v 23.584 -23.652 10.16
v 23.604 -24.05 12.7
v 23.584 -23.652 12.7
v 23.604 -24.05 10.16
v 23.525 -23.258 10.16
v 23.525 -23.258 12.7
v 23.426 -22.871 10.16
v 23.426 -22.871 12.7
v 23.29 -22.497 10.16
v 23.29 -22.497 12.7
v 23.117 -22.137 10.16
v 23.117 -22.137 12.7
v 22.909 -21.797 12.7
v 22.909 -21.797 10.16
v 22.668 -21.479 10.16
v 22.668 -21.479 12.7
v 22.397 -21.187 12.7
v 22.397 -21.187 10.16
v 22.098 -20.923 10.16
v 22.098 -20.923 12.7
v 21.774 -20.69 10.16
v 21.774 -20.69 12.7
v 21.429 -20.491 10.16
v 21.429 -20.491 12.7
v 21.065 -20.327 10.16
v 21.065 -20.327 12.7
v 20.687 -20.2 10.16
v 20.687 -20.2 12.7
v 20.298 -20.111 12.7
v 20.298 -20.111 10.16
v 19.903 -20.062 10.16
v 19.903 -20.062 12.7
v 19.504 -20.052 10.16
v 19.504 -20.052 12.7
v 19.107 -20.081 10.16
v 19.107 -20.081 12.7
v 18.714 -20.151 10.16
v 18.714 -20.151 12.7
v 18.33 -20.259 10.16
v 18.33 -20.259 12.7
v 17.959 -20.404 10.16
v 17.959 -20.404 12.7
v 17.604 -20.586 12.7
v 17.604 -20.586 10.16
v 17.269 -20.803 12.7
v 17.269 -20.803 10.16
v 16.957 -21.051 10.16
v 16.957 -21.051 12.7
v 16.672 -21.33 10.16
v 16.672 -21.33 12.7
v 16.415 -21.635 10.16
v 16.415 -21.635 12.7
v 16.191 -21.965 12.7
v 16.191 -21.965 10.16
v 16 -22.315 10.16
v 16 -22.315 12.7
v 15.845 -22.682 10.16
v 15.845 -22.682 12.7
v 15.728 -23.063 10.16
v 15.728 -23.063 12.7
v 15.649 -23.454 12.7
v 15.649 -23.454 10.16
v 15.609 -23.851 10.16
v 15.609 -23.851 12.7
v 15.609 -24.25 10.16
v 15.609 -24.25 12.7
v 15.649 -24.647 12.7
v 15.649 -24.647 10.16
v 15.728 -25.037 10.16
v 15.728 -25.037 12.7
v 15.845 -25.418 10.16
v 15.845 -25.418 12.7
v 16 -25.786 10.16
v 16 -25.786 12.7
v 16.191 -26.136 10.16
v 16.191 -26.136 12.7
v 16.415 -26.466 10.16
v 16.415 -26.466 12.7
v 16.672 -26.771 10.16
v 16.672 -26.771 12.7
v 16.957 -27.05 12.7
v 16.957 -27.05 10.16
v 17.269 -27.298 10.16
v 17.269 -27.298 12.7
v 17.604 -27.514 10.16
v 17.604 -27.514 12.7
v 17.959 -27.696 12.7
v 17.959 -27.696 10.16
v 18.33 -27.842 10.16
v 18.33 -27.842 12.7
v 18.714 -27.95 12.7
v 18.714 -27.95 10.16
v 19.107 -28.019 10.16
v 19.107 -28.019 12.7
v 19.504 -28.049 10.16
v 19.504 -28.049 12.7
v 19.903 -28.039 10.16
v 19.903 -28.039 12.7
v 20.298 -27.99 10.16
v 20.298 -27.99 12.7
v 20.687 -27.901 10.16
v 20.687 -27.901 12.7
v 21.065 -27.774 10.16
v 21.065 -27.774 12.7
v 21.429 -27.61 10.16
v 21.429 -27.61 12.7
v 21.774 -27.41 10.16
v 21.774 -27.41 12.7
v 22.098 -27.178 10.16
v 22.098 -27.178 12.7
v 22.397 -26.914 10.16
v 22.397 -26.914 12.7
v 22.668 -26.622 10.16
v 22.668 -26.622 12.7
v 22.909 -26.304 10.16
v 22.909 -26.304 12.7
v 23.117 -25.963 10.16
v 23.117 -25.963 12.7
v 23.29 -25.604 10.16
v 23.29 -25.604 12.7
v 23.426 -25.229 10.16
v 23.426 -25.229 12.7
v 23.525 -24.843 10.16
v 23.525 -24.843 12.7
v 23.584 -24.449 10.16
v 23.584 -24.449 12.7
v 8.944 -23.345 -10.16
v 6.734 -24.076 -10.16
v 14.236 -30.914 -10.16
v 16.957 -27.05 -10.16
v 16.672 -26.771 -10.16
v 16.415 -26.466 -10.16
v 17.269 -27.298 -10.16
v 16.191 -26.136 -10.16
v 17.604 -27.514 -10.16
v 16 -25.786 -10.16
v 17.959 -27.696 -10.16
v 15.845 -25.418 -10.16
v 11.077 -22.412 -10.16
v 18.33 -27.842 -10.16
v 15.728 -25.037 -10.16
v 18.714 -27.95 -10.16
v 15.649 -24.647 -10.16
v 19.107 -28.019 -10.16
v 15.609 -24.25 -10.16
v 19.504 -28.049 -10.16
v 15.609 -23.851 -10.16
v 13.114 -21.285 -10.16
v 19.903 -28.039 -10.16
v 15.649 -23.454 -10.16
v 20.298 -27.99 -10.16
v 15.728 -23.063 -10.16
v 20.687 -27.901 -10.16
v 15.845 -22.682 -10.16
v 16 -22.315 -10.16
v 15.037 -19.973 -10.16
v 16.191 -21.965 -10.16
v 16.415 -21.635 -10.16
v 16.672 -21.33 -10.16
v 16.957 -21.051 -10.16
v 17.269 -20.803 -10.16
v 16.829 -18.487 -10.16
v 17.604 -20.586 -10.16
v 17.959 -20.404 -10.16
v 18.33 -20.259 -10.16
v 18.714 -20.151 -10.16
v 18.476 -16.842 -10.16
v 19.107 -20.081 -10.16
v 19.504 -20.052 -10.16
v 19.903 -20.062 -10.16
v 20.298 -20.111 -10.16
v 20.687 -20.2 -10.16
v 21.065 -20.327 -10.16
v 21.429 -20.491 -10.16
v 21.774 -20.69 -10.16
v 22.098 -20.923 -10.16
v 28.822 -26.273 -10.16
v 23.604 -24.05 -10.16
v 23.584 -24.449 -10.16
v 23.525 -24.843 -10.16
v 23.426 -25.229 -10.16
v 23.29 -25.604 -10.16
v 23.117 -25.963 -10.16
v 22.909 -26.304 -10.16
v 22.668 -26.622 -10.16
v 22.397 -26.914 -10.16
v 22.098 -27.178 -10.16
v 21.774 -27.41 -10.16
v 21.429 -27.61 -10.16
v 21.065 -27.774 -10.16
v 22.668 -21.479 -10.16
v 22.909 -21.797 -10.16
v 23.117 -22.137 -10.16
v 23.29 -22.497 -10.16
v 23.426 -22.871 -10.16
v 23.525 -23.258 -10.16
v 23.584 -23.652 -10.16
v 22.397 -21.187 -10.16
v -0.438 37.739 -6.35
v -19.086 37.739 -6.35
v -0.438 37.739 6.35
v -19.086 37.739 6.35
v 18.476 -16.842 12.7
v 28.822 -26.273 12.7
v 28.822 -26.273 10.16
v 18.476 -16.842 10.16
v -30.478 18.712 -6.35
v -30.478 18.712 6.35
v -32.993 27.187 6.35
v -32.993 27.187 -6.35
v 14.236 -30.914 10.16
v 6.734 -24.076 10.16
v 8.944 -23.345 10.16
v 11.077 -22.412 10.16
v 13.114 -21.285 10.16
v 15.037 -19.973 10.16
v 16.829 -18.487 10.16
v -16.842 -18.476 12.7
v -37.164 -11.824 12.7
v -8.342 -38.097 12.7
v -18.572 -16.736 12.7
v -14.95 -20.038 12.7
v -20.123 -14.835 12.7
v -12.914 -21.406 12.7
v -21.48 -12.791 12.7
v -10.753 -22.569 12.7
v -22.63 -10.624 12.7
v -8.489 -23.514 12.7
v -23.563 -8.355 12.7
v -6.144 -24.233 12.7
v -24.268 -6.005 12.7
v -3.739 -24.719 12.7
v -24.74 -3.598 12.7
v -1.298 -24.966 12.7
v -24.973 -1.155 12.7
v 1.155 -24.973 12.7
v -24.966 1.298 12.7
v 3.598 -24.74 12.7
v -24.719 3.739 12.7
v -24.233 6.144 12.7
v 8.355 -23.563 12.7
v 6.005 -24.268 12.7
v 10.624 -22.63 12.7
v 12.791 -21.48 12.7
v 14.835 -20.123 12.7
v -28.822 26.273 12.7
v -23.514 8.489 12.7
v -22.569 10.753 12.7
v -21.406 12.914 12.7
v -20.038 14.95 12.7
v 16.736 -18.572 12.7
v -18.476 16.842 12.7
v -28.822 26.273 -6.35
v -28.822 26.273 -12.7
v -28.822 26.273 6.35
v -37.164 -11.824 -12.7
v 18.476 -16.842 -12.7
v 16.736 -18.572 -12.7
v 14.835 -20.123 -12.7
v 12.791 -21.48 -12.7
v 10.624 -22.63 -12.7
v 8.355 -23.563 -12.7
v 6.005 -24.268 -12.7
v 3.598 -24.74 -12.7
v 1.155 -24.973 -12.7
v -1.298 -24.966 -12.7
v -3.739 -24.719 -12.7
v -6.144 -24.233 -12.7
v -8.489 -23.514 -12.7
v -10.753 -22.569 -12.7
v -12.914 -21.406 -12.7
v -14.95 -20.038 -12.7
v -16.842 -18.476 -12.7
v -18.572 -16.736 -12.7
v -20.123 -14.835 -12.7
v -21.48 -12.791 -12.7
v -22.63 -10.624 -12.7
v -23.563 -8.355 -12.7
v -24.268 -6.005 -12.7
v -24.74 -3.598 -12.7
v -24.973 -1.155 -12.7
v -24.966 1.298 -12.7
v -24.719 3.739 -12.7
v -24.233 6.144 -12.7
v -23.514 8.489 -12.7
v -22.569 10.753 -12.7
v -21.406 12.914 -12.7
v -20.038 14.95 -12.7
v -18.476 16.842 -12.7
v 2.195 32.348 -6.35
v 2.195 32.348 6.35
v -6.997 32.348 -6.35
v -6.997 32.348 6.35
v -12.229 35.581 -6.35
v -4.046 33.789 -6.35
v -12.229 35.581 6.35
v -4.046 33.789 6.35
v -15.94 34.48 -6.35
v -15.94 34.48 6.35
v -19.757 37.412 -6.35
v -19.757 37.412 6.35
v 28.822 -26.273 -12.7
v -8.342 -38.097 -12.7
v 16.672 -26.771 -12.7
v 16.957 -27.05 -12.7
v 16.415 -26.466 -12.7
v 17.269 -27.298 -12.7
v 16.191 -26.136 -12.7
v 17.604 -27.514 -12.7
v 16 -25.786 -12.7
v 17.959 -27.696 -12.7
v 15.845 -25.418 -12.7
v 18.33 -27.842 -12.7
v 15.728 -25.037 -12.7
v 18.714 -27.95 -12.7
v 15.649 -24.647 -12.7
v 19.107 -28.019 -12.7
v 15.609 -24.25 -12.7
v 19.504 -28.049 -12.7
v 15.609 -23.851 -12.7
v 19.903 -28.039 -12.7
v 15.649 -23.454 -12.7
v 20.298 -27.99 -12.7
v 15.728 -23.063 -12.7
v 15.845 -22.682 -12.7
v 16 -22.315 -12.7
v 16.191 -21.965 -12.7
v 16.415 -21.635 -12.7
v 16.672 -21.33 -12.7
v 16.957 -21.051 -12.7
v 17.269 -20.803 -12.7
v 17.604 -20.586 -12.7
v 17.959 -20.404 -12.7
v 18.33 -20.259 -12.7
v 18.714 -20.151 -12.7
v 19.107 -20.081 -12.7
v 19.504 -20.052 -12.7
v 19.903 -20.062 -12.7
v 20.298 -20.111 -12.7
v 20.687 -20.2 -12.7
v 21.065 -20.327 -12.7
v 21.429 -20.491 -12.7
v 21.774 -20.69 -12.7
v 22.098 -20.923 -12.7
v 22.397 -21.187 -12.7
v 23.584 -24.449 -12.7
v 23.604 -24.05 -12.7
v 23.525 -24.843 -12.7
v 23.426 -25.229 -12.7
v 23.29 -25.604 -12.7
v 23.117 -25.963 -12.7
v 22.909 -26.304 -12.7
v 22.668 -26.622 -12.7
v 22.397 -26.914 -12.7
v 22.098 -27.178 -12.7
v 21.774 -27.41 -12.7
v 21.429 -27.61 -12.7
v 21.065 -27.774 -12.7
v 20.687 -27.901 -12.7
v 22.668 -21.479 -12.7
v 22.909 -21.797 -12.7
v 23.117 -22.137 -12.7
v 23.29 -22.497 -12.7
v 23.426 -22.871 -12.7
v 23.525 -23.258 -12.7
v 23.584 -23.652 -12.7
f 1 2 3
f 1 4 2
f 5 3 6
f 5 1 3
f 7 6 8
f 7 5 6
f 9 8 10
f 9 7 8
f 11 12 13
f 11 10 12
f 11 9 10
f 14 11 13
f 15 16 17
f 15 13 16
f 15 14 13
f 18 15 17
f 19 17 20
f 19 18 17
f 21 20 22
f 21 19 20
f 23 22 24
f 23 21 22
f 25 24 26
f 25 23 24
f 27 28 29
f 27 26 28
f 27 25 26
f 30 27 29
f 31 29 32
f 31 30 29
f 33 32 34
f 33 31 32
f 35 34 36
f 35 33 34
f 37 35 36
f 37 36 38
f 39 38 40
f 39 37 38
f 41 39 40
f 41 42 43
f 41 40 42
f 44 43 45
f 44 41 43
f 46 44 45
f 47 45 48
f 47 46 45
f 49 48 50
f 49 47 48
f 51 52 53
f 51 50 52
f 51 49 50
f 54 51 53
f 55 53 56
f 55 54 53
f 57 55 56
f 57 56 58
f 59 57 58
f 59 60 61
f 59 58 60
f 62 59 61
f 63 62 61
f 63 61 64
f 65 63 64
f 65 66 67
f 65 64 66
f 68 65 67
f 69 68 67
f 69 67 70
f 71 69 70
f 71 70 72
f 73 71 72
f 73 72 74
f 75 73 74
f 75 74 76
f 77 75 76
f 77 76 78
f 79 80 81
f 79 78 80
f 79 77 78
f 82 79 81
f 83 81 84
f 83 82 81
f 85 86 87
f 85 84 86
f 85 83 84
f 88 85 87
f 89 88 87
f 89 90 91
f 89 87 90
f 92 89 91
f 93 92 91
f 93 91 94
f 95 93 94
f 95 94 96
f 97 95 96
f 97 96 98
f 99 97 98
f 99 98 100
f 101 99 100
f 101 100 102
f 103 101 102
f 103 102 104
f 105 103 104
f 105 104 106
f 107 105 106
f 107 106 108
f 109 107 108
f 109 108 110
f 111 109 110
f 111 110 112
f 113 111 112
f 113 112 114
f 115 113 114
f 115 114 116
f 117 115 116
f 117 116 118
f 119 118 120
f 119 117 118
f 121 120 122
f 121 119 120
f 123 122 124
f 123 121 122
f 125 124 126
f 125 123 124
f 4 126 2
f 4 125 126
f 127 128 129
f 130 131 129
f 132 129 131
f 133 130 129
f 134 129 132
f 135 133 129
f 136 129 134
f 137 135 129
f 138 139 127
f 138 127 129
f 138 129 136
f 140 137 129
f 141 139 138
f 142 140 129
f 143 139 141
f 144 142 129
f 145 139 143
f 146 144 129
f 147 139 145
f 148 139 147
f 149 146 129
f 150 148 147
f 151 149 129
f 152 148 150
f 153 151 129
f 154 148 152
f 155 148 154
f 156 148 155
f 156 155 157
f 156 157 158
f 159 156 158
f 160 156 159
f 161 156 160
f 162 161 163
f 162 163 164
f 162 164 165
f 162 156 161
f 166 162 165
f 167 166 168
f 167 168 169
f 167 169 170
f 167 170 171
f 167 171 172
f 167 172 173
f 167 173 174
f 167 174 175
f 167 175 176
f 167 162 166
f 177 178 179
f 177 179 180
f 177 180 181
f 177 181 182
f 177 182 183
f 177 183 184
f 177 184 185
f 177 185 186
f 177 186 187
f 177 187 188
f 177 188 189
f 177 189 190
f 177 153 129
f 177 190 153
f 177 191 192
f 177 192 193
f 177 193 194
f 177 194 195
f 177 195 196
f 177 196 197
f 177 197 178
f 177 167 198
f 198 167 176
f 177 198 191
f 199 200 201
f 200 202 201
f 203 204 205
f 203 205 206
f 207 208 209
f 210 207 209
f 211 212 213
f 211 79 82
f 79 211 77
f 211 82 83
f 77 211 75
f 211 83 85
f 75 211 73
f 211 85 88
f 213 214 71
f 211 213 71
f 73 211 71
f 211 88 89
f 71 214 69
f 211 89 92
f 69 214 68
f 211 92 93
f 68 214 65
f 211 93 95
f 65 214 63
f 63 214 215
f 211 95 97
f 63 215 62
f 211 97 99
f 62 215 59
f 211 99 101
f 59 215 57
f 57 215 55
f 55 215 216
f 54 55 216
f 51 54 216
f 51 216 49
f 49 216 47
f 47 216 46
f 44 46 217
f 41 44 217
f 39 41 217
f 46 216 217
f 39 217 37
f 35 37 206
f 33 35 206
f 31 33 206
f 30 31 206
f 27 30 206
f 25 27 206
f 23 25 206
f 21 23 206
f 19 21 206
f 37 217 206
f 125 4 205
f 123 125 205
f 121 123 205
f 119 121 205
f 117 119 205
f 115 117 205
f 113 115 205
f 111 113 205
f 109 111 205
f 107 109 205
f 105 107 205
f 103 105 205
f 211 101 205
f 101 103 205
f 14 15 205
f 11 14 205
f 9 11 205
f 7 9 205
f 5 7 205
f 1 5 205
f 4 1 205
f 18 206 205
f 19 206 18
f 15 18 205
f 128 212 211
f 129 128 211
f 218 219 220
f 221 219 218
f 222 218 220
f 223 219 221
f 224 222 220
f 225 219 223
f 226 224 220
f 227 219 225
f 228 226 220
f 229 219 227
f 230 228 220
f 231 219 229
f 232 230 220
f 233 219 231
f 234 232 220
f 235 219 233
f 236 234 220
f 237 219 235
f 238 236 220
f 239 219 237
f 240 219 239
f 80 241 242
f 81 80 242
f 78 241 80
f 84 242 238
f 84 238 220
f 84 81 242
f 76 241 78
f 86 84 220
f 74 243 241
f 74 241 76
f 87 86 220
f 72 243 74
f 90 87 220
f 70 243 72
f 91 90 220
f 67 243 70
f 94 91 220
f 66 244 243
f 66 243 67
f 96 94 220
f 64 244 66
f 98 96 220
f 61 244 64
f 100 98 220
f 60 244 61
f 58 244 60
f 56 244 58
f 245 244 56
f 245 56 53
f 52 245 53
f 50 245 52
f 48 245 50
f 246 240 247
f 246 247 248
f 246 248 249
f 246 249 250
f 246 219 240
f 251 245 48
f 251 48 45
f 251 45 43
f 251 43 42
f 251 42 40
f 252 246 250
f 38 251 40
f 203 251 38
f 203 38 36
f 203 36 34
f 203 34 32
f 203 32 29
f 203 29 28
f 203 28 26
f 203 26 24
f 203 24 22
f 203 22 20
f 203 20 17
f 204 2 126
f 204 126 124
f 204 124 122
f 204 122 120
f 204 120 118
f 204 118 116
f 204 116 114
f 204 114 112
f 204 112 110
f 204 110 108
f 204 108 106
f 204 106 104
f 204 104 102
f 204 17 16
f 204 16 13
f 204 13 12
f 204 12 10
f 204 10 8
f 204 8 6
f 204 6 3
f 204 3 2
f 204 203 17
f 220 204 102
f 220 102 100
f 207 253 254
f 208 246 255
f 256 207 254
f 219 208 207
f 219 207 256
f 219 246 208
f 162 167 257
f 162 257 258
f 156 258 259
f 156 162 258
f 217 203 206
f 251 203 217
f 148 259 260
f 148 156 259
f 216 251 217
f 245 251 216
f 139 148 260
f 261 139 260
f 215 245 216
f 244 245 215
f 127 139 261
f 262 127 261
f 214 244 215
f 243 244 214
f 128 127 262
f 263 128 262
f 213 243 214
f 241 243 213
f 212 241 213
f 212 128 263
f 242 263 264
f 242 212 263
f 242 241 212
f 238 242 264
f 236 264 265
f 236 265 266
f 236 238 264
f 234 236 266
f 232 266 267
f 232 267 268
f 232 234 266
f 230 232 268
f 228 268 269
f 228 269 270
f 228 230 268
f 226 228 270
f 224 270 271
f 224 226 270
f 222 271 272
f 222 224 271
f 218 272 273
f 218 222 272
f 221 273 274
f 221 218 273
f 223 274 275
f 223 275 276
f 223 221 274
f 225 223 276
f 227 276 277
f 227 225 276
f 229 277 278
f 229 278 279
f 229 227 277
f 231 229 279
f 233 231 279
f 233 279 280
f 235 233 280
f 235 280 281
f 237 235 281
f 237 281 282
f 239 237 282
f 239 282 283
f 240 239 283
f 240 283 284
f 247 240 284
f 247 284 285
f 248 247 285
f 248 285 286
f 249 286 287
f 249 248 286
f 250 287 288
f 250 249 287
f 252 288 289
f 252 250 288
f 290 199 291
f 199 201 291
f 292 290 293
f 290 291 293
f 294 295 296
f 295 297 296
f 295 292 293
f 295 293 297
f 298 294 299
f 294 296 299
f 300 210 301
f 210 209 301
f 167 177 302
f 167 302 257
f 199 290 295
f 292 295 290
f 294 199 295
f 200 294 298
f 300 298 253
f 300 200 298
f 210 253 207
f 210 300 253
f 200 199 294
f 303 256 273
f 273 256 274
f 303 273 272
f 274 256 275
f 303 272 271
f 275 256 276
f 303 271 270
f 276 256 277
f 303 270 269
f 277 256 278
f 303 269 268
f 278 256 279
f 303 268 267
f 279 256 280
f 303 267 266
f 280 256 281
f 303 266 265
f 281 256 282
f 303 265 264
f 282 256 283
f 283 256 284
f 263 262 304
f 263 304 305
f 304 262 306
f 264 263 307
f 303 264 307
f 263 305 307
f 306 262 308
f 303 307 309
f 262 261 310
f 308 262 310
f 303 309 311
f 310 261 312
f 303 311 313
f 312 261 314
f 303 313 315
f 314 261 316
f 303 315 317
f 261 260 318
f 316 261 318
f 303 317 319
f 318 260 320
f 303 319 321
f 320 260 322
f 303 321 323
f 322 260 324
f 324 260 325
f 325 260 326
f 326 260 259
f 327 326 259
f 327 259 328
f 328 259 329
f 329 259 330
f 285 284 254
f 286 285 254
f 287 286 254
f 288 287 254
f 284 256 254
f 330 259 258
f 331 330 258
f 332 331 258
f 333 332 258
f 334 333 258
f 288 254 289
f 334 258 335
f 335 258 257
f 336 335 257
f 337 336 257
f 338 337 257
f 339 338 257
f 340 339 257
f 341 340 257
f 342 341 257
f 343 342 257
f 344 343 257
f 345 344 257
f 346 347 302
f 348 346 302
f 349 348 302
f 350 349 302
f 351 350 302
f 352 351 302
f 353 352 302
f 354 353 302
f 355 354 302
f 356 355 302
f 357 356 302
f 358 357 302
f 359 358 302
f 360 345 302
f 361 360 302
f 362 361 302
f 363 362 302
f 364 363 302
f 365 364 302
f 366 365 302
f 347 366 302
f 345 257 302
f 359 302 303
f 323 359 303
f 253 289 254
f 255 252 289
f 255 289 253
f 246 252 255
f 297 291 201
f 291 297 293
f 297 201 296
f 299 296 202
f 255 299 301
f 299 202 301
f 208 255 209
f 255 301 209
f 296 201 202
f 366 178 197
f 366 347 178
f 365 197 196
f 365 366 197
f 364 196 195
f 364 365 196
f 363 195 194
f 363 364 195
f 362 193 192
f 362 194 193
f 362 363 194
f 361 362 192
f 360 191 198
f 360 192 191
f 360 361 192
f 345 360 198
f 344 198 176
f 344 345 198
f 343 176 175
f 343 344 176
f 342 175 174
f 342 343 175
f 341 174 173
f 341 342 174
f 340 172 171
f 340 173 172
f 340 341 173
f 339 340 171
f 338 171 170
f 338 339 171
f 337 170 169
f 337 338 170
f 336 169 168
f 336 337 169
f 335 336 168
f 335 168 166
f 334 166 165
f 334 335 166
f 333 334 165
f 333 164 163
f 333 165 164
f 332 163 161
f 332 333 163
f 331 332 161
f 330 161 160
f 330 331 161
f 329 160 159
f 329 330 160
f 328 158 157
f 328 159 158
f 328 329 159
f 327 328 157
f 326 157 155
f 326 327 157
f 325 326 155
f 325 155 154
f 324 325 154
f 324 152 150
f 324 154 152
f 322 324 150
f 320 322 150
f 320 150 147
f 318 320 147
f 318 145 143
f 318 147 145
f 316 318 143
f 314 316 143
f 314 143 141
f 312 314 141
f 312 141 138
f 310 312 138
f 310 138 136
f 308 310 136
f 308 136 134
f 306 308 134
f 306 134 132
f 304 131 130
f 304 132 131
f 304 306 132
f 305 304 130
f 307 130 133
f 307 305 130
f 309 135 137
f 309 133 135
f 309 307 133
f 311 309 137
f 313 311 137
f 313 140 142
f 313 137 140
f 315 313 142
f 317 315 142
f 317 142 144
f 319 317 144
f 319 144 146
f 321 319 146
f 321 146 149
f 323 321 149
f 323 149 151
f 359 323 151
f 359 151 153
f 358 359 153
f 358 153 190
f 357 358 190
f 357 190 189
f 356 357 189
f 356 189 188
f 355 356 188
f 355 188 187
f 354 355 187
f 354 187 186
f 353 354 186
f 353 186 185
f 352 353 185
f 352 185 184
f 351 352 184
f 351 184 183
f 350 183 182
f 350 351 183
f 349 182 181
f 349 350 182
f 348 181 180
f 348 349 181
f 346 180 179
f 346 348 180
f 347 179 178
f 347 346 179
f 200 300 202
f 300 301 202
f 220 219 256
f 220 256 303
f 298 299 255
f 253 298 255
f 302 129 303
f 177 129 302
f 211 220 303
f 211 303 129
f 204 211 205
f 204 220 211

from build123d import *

# Parameters (mm, degrees)
BOSS_EXTRUDE1_DEPTH     = 12.7
CUT_EXTRUDE1_DEPTH      = 10.16
CUT_EXTRUDE2_DEPTH      = 59.972520527
CUT_EXTRUDE2_DEPTH_BACK = 59.972520527
SKETCH3_R               = 4
BOSS_EXTRUDE2_DEPTH     = 6.35


with BuildPart() as part:
    # Sketch1 → Boss-Extrude1 (new, symmetric)
    with BuildSketch(Plane.XY):
        with BuildLine():
            Line((-18.475736443, 16.841827778), (-28.822148851, 26.273251333))
            Line((-28.822148851, 26.273251333), (-37.16437752, -11.82408743))
            Line((-37.16437752, -11.82408743), (-8.342228669, -38.097338763))
            Line((-8.342228669, -38.097338763), (28.822148851, -26.273251333))
            Line((28.822148851, -26.273251333), (18.475736443, -16.841827778))
            ThreePointArc((18.475736443, -16.841827778), (-16.841827778, -18.475736443), (-18.475736443, 16.841827778))
        make_face()
    extrude(amount=BOSS_EXTRUDE1_DEPTH, both=True)

    # Sketch2 → Cut-Extrude1 (cut, symmetric)
    with BuildSketch(Plane.XY):
        Polygon((3.04575912, -20.713698515), (17.349372708, -33.752366684), (38.911165868, -25.491143251), (19.249454098, -2.938003279), align=None)
    extrude(amount=CUT_EXTRUDE1_DEPTH, both=True, mode=Mode.SUBTRACT)

    # Sketch3 → Cut-Extrude2 (cut, two sides: drawn at the far end of the back side and taken through both)
    with BuildSketch(Plane.XY.offset(12.7).offset(-CUT_EXTRUDE2_DEPTH_BACK)):
        with Locations((19.603889038, -24.050389858)):
            Circle(SKETCH3_R)
    extrude(amount=CUT_EXTRUDE2_DEPTH + CUT_EXTRUDE2_DEPTH_BACK, mode=Mode.SUBTRACT)

    # Sketch5 → Boss-Extrude2 (add, symmetric)
    with BuildSketch(Plane.XY):
        Polygon((-30.477907749, 18.711721897), (-32.993263185, 27.186606195), (-19.756729053, 37.411947448), (-19.086323313, 37.739354902), (-0.437878578, 37.739354902), (2.195133213, 32.347949806), (-6.996558268, 32.347949806), (-4.046072735, 33.788884601), (-12.229481166, 35.580817231), (-15.939758745, 34.479602565), (-28.822148851, 26.273251333), align=None)
    extrude(amount=BOSS_EXTRUDE2_DEPTH, both=True)


solid = part.part
